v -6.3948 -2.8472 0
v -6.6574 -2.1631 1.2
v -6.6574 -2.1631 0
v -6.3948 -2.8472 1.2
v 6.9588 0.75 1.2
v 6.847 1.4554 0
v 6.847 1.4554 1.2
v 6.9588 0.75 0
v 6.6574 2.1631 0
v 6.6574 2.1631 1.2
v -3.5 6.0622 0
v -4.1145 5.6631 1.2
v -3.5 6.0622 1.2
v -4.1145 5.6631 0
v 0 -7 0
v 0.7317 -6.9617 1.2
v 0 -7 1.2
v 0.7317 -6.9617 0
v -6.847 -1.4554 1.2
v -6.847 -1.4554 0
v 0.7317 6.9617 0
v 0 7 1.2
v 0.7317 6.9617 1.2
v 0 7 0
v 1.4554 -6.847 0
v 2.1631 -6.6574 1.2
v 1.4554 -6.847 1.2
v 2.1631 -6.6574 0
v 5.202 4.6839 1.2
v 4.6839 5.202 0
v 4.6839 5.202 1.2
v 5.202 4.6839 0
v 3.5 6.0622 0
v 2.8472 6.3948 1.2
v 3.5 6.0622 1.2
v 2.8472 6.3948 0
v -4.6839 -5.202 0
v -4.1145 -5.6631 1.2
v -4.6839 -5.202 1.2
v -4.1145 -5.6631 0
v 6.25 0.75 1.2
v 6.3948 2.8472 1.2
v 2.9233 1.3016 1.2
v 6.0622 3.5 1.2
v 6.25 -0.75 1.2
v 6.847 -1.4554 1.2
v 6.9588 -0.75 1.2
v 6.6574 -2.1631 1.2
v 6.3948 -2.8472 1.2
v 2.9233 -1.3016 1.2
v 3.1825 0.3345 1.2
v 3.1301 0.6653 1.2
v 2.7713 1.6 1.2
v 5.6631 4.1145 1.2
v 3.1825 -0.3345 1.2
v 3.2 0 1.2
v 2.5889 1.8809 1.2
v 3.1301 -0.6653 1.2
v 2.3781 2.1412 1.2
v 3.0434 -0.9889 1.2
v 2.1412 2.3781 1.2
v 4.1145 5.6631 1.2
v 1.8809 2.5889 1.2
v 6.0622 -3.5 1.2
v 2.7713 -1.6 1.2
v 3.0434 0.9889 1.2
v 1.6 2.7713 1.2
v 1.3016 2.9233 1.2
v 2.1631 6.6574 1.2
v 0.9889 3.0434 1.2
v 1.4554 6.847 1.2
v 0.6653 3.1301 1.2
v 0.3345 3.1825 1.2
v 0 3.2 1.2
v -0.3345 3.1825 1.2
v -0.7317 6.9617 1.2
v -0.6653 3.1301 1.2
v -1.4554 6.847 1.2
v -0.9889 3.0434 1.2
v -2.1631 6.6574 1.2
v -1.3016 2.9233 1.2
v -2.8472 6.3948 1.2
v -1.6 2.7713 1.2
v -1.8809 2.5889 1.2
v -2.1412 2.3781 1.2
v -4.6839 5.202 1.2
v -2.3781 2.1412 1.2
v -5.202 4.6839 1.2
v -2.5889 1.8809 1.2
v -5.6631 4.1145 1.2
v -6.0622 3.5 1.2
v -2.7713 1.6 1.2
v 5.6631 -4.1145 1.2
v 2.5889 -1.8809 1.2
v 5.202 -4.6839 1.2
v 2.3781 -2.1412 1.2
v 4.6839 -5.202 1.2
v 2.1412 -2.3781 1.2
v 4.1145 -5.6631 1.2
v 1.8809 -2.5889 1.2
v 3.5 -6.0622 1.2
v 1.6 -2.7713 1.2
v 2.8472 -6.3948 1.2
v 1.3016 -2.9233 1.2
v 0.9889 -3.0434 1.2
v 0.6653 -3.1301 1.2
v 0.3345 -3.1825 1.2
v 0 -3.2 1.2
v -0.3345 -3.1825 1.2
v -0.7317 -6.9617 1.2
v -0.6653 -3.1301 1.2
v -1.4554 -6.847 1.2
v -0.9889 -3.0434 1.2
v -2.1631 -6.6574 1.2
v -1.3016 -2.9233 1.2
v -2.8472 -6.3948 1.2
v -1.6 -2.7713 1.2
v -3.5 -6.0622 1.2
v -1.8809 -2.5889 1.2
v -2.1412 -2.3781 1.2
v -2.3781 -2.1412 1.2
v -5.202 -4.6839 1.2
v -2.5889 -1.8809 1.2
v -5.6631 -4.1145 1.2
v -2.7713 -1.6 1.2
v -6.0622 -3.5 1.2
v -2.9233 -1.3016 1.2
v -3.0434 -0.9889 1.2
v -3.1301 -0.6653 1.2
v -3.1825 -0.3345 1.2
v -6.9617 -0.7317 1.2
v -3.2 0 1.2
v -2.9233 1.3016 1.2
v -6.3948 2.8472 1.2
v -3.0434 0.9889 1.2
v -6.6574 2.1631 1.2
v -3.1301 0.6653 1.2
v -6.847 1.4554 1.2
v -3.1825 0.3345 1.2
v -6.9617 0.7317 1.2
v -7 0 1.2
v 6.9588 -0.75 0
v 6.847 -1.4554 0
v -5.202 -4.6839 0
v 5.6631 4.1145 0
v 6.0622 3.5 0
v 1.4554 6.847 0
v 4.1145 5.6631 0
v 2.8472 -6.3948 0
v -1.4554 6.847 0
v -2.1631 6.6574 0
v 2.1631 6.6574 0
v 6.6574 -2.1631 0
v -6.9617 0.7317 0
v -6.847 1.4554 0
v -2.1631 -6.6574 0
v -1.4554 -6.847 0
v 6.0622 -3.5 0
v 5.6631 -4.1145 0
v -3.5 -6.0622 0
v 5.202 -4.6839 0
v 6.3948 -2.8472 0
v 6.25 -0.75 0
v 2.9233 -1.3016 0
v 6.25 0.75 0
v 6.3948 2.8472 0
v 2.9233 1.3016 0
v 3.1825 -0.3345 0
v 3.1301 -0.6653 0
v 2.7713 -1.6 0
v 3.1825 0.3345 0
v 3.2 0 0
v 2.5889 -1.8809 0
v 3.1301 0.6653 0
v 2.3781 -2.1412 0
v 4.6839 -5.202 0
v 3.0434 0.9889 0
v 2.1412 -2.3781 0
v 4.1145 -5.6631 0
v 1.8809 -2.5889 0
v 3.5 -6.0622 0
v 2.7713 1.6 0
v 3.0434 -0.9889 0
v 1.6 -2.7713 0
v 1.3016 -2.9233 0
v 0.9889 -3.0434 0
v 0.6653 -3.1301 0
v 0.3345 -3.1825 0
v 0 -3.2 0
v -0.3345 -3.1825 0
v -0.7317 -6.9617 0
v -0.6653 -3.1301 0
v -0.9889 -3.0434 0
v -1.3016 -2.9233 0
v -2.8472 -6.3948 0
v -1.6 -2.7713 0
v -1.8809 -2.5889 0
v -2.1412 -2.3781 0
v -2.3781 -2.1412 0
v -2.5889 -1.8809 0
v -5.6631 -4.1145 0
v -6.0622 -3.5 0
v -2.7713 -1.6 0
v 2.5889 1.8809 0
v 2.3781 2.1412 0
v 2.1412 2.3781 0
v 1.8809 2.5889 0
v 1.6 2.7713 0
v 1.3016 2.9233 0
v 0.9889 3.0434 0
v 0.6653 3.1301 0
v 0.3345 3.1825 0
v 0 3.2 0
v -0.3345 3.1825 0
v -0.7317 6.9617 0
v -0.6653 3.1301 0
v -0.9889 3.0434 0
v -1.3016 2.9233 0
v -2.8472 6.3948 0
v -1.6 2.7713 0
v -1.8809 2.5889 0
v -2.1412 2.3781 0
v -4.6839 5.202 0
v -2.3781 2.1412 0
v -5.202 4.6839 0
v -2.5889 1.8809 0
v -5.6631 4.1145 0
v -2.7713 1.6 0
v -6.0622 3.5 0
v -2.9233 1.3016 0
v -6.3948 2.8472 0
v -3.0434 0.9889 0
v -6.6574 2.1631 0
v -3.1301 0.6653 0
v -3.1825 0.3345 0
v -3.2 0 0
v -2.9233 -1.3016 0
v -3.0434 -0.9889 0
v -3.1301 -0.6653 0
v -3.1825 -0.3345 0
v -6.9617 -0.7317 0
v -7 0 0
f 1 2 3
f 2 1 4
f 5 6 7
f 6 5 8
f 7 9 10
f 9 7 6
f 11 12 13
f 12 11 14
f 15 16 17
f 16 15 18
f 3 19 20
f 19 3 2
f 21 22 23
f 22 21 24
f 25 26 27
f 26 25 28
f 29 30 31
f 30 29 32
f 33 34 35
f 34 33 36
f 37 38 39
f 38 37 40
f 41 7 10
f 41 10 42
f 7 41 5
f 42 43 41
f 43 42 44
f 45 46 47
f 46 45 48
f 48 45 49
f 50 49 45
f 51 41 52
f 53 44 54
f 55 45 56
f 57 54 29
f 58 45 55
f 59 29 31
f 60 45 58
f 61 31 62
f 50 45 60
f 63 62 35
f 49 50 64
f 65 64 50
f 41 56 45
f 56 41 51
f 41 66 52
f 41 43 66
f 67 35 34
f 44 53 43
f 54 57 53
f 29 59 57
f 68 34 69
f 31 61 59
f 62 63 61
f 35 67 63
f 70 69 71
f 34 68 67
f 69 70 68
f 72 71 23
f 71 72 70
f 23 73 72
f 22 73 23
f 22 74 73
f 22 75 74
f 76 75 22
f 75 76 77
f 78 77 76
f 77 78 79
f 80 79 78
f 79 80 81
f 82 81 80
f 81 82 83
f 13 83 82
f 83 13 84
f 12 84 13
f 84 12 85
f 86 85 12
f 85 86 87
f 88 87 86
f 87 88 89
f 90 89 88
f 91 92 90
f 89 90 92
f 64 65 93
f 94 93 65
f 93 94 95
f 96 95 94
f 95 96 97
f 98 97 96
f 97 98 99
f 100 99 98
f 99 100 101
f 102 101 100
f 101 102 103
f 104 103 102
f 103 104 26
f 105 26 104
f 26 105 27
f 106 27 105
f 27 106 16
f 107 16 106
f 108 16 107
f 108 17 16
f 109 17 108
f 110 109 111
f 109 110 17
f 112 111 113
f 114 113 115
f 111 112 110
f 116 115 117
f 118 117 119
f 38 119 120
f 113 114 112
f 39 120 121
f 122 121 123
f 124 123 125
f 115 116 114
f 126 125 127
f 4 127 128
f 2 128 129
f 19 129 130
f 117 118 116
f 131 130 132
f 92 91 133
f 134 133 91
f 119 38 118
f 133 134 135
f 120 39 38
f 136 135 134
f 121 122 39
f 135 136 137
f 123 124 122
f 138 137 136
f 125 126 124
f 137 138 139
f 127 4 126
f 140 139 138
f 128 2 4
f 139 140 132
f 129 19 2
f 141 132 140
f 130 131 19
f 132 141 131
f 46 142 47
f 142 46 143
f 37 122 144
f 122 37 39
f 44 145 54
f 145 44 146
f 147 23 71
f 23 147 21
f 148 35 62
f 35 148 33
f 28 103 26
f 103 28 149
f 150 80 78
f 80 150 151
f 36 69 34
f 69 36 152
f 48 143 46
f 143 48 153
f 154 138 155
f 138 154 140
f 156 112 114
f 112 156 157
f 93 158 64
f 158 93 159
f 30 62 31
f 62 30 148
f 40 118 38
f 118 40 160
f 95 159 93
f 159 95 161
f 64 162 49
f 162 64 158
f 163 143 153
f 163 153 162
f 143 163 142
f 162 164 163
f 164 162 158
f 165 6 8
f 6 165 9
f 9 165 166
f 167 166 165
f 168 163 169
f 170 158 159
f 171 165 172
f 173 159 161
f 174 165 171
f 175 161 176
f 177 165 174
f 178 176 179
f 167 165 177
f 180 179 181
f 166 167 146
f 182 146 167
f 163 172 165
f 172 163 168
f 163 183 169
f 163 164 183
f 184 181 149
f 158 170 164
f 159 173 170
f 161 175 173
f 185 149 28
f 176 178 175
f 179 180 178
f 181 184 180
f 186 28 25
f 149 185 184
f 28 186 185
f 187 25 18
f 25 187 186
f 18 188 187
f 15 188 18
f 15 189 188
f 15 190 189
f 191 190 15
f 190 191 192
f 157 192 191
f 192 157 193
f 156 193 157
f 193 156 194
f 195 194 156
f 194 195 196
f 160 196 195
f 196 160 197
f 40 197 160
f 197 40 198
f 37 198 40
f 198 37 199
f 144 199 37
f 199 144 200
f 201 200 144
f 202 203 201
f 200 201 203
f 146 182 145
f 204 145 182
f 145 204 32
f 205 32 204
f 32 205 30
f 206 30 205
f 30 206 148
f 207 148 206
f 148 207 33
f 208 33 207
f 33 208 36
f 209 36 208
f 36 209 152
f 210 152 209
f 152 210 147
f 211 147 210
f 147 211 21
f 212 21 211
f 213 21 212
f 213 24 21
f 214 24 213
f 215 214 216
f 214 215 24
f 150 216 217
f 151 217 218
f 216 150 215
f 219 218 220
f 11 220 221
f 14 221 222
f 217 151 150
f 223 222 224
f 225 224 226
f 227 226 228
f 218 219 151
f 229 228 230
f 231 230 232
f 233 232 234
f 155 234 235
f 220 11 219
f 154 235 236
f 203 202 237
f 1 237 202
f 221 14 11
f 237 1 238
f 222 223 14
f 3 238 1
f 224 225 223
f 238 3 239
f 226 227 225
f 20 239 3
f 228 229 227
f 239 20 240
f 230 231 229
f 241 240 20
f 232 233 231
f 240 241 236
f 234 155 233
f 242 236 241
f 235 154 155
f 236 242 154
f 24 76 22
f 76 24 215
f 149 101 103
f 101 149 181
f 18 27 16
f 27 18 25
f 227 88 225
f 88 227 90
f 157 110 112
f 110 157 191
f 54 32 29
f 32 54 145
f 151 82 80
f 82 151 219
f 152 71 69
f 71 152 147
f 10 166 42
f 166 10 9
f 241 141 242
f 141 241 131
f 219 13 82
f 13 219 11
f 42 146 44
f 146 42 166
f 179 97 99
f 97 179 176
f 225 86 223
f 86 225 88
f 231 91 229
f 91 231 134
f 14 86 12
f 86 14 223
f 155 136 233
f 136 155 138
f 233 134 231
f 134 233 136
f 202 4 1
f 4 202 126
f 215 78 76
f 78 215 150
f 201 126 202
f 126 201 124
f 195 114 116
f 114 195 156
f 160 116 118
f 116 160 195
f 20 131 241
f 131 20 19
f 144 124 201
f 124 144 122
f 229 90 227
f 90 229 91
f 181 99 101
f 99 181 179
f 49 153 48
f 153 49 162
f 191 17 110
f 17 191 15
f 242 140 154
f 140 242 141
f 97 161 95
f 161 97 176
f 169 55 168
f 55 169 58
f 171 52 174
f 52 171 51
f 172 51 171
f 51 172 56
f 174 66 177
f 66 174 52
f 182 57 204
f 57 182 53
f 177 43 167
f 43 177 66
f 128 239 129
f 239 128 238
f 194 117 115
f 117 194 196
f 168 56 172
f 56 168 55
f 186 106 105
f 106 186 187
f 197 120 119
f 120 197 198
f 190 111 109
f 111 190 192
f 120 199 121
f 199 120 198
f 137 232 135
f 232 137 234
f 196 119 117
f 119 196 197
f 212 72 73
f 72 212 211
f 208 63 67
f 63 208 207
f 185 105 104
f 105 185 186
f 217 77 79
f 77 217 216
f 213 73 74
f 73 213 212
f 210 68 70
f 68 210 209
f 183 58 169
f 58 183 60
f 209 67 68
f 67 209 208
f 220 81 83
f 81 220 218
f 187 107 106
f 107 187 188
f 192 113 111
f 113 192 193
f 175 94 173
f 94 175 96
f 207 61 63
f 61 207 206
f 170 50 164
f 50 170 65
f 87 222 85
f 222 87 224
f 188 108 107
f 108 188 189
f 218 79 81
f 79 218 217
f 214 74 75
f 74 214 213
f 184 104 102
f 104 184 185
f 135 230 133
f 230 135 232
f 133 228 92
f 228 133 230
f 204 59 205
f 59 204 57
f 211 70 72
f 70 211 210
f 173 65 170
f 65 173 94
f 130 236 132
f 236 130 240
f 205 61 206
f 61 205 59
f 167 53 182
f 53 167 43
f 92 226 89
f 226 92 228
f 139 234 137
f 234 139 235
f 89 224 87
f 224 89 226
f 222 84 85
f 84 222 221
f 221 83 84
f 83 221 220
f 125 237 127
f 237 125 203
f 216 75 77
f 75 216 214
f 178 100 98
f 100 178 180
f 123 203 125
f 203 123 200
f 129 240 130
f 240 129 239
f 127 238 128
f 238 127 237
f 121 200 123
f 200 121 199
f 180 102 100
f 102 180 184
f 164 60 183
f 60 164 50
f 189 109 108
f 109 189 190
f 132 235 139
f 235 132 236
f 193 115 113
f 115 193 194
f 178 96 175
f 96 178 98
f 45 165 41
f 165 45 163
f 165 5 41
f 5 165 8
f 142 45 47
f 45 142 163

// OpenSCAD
// Split lock washer.
$fn = 60;
eps = 0.02;
inner_d = 6.4;
outer_d = 14;
thickness = 1.2;
gap = 1.5;
difference() {
    cylinder(d=outer_d,h=thickness);
    translate([0,0,-eps]) cylinder(d=inner_d,h=thickness+2*eps);
    translate([outer_d/2-gap/2,-gap/2,-eps]) cube([gap+eps,gap,thickness+2*eps]);
}
